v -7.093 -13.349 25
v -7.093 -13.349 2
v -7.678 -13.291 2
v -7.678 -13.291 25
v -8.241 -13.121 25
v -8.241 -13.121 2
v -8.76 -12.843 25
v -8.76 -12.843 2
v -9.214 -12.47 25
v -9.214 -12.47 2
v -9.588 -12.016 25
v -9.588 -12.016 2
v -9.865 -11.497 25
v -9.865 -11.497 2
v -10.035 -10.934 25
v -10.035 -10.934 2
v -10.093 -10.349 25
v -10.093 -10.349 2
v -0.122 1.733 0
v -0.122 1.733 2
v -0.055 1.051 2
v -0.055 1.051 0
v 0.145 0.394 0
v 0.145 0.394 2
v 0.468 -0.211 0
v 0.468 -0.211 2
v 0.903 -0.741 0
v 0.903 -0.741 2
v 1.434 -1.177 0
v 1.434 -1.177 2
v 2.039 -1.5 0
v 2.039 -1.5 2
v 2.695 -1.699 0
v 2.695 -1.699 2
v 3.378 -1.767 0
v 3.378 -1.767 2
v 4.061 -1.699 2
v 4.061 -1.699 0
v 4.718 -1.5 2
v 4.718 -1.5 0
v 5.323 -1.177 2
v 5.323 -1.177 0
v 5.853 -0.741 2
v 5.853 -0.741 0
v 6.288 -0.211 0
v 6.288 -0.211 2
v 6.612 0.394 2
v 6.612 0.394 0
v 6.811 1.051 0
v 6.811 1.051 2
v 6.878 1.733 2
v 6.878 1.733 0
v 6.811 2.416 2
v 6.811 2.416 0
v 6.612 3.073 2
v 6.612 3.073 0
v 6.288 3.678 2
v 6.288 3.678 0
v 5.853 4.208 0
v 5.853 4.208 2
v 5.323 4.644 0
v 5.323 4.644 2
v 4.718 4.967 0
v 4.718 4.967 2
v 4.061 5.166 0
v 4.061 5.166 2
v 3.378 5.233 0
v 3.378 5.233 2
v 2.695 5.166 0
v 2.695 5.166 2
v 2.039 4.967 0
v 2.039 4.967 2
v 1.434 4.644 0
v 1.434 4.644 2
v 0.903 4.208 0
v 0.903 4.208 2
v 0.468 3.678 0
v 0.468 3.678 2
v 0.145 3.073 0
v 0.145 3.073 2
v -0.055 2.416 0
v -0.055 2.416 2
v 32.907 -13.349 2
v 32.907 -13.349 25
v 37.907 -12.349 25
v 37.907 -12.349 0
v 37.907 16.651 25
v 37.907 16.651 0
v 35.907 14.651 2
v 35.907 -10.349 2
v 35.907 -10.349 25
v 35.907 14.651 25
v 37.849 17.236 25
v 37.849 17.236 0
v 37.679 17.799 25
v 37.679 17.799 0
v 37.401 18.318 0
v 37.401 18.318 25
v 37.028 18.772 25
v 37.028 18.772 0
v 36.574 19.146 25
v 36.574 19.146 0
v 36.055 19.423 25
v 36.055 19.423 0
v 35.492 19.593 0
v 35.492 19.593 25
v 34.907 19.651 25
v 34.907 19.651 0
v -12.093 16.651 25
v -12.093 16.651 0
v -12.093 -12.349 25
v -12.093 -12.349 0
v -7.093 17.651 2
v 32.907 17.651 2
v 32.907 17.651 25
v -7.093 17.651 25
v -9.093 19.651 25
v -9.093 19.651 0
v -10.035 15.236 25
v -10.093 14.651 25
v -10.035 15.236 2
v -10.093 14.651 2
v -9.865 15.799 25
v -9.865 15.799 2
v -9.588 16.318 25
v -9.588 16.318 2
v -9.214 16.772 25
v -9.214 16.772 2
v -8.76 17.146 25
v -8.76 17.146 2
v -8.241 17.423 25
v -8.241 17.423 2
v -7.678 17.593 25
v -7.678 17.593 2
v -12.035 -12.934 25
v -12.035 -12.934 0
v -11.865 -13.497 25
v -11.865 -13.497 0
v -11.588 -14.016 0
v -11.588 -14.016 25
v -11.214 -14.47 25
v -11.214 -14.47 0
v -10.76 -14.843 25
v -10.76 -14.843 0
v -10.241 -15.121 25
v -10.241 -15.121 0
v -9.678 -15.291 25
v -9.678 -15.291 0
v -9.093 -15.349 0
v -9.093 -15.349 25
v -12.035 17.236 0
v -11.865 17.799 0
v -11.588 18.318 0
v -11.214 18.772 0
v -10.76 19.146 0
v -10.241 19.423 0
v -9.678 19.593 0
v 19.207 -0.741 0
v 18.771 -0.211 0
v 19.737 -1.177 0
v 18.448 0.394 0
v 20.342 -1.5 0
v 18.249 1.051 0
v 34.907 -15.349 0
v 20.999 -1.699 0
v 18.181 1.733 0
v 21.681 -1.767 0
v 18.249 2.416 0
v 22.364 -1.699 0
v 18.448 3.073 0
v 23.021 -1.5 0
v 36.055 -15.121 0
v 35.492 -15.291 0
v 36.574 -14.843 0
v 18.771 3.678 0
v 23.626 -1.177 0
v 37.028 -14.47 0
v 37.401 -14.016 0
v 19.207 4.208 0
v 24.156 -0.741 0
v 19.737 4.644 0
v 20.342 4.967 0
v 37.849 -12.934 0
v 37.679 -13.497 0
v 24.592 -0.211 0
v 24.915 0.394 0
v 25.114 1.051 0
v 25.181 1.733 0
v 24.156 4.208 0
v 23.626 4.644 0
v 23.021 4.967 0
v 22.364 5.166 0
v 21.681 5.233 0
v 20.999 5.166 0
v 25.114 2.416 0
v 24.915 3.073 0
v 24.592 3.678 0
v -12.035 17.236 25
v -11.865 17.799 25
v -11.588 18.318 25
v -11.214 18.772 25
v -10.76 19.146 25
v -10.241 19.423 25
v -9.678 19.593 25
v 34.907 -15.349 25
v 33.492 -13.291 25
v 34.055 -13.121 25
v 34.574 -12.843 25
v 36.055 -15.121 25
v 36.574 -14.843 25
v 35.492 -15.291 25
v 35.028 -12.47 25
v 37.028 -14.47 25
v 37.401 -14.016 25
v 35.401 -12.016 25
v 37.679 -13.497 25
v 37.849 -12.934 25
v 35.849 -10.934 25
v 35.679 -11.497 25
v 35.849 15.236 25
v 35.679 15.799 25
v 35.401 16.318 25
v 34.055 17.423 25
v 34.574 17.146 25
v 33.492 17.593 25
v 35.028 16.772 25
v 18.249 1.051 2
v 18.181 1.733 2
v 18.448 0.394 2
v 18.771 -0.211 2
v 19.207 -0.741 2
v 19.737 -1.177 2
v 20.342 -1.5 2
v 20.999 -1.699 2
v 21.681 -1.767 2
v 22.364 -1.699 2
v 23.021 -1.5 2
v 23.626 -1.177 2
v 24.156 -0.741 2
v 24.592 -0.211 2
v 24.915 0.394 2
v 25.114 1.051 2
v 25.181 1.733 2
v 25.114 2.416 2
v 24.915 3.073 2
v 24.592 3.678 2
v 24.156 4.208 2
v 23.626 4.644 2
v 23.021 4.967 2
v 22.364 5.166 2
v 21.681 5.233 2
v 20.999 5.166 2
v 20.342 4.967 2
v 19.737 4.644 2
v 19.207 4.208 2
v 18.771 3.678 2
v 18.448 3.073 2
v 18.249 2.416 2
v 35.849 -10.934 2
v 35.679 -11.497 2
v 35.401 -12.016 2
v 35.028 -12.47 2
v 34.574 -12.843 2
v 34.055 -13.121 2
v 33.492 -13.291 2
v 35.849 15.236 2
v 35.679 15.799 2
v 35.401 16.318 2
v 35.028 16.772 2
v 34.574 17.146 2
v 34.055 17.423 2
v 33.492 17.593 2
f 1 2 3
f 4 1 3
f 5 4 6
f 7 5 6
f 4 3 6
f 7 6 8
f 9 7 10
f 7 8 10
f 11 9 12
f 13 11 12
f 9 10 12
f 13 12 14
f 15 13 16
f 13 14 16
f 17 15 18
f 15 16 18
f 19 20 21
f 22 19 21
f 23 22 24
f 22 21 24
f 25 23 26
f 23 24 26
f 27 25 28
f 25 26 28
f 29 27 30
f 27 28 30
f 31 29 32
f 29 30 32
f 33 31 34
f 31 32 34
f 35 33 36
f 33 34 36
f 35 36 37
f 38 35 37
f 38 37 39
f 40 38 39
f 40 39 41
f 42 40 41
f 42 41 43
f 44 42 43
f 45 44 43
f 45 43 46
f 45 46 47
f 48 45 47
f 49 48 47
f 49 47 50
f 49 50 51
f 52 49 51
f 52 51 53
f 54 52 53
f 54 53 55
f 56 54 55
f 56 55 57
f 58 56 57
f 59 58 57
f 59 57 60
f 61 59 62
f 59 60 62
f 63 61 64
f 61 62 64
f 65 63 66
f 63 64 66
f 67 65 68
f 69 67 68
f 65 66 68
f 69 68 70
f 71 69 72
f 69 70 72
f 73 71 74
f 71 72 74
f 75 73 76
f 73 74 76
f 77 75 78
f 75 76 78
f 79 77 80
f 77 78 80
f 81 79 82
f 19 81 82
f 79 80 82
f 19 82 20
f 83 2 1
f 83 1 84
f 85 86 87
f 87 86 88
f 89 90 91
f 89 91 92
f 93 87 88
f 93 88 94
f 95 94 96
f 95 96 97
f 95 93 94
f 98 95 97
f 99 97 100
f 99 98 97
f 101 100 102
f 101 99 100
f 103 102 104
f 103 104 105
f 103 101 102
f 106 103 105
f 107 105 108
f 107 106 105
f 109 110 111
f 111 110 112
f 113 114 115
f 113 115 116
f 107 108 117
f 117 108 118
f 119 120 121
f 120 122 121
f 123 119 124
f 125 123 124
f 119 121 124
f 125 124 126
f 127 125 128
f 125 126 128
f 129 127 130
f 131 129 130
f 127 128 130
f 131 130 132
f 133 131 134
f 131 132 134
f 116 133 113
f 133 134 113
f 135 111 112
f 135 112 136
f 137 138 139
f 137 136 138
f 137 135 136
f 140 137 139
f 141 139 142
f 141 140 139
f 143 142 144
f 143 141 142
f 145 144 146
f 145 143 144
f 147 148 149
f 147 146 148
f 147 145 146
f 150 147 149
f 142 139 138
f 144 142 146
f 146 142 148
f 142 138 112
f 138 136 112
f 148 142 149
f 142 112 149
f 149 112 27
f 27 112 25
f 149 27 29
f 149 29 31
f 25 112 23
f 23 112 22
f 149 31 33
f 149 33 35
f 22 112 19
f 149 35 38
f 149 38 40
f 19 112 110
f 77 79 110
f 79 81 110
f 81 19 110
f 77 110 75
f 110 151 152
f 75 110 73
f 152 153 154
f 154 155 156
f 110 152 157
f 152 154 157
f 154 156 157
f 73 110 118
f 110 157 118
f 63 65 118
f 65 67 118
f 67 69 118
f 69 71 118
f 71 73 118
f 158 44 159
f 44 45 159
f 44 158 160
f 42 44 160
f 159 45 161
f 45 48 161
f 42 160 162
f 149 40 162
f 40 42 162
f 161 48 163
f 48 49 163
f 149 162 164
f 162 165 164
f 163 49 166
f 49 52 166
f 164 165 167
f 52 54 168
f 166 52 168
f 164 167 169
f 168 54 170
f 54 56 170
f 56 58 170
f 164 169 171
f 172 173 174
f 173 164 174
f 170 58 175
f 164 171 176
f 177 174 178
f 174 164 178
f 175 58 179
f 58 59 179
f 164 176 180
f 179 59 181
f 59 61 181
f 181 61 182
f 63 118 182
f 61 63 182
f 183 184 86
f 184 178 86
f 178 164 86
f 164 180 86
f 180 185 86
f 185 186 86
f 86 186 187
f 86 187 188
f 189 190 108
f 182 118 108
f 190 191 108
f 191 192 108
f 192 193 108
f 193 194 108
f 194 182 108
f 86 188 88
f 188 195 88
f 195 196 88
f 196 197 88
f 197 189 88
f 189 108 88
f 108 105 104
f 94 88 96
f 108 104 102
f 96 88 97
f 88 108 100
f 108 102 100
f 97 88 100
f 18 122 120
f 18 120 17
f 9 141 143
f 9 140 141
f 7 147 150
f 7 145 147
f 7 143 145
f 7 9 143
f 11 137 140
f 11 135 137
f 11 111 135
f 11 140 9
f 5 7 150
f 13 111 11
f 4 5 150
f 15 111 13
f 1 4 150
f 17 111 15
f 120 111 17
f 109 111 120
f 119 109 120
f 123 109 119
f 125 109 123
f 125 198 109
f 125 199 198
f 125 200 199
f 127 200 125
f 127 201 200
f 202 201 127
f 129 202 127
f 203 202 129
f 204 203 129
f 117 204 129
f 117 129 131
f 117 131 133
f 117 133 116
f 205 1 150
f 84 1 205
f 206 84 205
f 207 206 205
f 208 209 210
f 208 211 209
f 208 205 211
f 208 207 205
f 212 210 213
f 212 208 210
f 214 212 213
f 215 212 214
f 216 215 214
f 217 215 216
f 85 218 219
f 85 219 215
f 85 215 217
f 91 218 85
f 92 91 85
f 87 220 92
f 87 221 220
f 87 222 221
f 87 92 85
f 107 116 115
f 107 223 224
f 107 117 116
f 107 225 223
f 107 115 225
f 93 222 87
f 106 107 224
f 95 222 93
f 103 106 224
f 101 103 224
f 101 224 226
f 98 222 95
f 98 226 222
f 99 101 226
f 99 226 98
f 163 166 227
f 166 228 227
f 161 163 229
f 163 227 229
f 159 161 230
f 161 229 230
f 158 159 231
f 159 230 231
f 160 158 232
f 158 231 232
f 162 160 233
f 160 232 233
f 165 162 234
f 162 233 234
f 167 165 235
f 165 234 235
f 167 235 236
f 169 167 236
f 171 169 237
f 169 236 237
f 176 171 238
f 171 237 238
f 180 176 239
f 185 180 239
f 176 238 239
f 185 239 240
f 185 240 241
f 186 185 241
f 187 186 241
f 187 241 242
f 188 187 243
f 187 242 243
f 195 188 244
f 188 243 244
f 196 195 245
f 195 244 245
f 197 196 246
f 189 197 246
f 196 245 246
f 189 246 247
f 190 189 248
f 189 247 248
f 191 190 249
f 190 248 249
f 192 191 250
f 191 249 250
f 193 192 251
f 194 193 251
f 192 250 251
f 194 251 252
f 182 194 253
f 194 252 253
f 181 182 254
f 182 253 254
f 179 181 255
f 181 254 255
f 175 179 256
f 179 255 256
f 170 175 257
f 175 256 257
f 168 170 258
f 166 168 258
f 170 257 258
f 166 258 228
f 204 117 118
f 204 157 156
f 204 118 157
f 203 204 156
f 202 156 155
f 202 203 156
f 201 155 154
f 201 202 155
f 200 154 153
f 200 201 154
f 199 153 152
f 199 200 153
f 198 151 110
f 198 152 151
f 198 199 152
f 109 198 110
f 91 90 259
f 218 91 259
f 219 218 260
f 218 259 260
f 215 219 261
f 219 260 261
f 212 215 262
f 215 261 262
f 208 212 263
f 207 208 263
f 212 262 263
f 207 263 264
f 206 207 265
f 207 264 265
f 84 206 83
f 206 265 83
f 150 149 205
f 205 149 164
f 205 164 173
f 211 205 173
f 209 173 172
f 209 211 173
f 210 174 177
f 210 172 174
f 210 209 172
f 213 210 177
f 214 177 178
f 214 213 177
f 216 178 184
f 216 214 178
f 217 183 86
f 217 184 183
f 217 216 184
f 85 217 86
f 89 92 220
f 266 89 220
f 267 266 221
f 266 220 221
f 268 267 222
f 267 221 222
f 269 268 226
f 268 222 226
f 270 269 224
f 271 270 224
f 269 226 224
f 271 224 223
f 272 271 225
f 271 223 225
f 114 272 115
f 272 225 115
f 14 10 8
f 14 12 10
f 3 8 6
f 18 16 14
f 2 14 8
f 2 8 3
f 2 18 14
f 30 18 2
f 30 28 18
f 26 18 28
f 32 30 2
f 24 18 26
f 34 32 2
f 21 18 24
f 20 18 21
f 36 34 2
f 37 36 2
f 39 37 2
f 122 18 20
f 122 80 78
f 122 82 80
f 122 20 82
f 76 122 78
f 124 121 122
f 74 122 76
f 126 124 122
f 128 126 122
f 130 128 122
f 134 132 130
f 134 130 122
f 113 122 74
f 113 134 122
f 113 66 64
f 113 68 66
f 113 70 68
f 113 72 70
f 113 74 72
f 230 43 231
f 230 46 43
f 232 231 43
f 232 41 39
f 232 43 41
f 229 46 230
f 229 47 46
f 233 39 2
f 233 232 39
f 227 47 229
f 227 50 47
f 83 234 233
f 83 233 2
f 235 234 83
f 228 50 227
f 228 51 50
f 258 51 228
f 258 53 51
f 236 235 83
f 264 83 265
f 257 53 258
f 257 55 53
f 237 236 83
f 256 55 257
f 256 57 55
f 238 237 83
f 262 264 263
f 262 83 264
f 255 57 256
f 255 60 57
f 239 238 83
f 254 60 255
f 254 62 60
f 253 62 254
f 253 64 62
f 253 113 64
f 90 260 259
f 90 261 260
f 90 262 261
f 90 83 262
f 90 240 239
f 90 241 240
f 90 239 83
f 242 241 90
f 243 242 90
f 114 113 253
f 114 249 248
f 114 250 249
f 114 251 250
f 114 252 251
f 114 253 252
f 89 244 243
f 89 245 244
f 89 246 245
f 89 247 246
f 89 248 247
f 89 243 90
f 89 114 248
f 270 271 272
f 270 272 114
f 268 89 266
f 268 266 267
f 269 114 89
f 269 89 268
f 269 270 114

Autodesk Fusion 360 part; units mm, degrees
sketch "Sketch1" plane through (0, 0, 0) normal (0, 0, 1) x (1, 0, 0)
  line L0 (37.9069, 19.6511) -> (-12.0931, 19.6511)
  line L1 (-12.0931, 19.6511) -> (-12.0931, -15.3489)
  line L2 (-12.0931, -15.3489) -> (37.9069, -15.3489)
  line L3 (37.9069, -15.3489) -> (37.9069, 19.6511)
  dimension "d1" = 50
  dimension "d2" = 35
extrude "Extrude1" add sketch "Sketch1" along normal blind 25
shell "Shell1" thickness 2 removed faces 1 at (4.5736, 7.9845, 25)
fillet "Fillet1" radius 3 8 edges at (37.9069, -15.3489, 12.5) (37.9069, 19.6511, 12.5) (-10.0931, -13.3489, 13.5) (-12.0931, 19.6511, 12.5) (35.9069, 17.6511, 13.5) (-12.0931, -15.3489, 12.5) (-10.0931, 17.6511, 13.5) (35.9069, -13.3489, 13.5)
sketch "Sketch2" plane through (0, 0, 25) normal (0, 0, 1) x (-1, 0, 0)
  line L0 (-32.9069, 13.3489) -> (7.0931, 13.3489)
  arc A0 (10.0931, 10.3489) -> (7.0931, 13.3489) centre (7.0931, 10.3489) ccw
  line L1 (10.0931, 10.3489) -> (10.0931, -14.6511)
  arc A1 (7.0931, -17.6511) -> (10.0931, -14.6511) centre (7.0931, -14.6511) ccw
  line L2 (7.0931, -17.6511) -> (-32.9069, -17.6511)
  arc A2 (-35.9069, -14.6511) -> (-32.9069, -17.6511) centre (-32.9069, -14.6511) ccw
  line L3 (-35.9069, -14.6511) -> (-35.9069, 10.3489)
  arc A3 (-32.9069, 13.3489) -> (-35.9069, 10.3489) centre (-32.9069, 10.3489) ccw
  arc A4 (12.0931, 12.3489) -> (9.0931, 15.3489) centre (9.0931, 12.3489) ccw
  line L4 (9.0931, 15.3489) -> (-34.9069, 15.3489)
  arc A5 (-34.9069, 15.3489) -> (-37.9069, 12.3489) centre (-34.9069, 12.3489) ccw
  line L5 (-37.9069, 12.3489) -> (-37.9069, -16.6511)
  arc A6 (-37.9069, -16.6511) -> (-34.9069, -19.6511) centre (-34.9069, -16.6511) ccw
  line L6 (-34.9069, -19.6511) -> (9.0931, -19.6511)
  arc A7 (9.0931, -19.6511) -> (12.0931, -16.6511) centre (9.0931, -16.6511) ccw
  line L7 (12.0931, -16.6511) -> (12.0931, 12.3489)
  circle A8 centre (-21.6814, -1.7334) radius 3.5
  circle A9 centre (-3.3782, -1.7334) radius 3.5
  dimension "d8" = 7
  dimension "d9" = 7
extrude "Extrude2" cut sketch "Sketch2" against normal blind 60 contours A8 | A9
